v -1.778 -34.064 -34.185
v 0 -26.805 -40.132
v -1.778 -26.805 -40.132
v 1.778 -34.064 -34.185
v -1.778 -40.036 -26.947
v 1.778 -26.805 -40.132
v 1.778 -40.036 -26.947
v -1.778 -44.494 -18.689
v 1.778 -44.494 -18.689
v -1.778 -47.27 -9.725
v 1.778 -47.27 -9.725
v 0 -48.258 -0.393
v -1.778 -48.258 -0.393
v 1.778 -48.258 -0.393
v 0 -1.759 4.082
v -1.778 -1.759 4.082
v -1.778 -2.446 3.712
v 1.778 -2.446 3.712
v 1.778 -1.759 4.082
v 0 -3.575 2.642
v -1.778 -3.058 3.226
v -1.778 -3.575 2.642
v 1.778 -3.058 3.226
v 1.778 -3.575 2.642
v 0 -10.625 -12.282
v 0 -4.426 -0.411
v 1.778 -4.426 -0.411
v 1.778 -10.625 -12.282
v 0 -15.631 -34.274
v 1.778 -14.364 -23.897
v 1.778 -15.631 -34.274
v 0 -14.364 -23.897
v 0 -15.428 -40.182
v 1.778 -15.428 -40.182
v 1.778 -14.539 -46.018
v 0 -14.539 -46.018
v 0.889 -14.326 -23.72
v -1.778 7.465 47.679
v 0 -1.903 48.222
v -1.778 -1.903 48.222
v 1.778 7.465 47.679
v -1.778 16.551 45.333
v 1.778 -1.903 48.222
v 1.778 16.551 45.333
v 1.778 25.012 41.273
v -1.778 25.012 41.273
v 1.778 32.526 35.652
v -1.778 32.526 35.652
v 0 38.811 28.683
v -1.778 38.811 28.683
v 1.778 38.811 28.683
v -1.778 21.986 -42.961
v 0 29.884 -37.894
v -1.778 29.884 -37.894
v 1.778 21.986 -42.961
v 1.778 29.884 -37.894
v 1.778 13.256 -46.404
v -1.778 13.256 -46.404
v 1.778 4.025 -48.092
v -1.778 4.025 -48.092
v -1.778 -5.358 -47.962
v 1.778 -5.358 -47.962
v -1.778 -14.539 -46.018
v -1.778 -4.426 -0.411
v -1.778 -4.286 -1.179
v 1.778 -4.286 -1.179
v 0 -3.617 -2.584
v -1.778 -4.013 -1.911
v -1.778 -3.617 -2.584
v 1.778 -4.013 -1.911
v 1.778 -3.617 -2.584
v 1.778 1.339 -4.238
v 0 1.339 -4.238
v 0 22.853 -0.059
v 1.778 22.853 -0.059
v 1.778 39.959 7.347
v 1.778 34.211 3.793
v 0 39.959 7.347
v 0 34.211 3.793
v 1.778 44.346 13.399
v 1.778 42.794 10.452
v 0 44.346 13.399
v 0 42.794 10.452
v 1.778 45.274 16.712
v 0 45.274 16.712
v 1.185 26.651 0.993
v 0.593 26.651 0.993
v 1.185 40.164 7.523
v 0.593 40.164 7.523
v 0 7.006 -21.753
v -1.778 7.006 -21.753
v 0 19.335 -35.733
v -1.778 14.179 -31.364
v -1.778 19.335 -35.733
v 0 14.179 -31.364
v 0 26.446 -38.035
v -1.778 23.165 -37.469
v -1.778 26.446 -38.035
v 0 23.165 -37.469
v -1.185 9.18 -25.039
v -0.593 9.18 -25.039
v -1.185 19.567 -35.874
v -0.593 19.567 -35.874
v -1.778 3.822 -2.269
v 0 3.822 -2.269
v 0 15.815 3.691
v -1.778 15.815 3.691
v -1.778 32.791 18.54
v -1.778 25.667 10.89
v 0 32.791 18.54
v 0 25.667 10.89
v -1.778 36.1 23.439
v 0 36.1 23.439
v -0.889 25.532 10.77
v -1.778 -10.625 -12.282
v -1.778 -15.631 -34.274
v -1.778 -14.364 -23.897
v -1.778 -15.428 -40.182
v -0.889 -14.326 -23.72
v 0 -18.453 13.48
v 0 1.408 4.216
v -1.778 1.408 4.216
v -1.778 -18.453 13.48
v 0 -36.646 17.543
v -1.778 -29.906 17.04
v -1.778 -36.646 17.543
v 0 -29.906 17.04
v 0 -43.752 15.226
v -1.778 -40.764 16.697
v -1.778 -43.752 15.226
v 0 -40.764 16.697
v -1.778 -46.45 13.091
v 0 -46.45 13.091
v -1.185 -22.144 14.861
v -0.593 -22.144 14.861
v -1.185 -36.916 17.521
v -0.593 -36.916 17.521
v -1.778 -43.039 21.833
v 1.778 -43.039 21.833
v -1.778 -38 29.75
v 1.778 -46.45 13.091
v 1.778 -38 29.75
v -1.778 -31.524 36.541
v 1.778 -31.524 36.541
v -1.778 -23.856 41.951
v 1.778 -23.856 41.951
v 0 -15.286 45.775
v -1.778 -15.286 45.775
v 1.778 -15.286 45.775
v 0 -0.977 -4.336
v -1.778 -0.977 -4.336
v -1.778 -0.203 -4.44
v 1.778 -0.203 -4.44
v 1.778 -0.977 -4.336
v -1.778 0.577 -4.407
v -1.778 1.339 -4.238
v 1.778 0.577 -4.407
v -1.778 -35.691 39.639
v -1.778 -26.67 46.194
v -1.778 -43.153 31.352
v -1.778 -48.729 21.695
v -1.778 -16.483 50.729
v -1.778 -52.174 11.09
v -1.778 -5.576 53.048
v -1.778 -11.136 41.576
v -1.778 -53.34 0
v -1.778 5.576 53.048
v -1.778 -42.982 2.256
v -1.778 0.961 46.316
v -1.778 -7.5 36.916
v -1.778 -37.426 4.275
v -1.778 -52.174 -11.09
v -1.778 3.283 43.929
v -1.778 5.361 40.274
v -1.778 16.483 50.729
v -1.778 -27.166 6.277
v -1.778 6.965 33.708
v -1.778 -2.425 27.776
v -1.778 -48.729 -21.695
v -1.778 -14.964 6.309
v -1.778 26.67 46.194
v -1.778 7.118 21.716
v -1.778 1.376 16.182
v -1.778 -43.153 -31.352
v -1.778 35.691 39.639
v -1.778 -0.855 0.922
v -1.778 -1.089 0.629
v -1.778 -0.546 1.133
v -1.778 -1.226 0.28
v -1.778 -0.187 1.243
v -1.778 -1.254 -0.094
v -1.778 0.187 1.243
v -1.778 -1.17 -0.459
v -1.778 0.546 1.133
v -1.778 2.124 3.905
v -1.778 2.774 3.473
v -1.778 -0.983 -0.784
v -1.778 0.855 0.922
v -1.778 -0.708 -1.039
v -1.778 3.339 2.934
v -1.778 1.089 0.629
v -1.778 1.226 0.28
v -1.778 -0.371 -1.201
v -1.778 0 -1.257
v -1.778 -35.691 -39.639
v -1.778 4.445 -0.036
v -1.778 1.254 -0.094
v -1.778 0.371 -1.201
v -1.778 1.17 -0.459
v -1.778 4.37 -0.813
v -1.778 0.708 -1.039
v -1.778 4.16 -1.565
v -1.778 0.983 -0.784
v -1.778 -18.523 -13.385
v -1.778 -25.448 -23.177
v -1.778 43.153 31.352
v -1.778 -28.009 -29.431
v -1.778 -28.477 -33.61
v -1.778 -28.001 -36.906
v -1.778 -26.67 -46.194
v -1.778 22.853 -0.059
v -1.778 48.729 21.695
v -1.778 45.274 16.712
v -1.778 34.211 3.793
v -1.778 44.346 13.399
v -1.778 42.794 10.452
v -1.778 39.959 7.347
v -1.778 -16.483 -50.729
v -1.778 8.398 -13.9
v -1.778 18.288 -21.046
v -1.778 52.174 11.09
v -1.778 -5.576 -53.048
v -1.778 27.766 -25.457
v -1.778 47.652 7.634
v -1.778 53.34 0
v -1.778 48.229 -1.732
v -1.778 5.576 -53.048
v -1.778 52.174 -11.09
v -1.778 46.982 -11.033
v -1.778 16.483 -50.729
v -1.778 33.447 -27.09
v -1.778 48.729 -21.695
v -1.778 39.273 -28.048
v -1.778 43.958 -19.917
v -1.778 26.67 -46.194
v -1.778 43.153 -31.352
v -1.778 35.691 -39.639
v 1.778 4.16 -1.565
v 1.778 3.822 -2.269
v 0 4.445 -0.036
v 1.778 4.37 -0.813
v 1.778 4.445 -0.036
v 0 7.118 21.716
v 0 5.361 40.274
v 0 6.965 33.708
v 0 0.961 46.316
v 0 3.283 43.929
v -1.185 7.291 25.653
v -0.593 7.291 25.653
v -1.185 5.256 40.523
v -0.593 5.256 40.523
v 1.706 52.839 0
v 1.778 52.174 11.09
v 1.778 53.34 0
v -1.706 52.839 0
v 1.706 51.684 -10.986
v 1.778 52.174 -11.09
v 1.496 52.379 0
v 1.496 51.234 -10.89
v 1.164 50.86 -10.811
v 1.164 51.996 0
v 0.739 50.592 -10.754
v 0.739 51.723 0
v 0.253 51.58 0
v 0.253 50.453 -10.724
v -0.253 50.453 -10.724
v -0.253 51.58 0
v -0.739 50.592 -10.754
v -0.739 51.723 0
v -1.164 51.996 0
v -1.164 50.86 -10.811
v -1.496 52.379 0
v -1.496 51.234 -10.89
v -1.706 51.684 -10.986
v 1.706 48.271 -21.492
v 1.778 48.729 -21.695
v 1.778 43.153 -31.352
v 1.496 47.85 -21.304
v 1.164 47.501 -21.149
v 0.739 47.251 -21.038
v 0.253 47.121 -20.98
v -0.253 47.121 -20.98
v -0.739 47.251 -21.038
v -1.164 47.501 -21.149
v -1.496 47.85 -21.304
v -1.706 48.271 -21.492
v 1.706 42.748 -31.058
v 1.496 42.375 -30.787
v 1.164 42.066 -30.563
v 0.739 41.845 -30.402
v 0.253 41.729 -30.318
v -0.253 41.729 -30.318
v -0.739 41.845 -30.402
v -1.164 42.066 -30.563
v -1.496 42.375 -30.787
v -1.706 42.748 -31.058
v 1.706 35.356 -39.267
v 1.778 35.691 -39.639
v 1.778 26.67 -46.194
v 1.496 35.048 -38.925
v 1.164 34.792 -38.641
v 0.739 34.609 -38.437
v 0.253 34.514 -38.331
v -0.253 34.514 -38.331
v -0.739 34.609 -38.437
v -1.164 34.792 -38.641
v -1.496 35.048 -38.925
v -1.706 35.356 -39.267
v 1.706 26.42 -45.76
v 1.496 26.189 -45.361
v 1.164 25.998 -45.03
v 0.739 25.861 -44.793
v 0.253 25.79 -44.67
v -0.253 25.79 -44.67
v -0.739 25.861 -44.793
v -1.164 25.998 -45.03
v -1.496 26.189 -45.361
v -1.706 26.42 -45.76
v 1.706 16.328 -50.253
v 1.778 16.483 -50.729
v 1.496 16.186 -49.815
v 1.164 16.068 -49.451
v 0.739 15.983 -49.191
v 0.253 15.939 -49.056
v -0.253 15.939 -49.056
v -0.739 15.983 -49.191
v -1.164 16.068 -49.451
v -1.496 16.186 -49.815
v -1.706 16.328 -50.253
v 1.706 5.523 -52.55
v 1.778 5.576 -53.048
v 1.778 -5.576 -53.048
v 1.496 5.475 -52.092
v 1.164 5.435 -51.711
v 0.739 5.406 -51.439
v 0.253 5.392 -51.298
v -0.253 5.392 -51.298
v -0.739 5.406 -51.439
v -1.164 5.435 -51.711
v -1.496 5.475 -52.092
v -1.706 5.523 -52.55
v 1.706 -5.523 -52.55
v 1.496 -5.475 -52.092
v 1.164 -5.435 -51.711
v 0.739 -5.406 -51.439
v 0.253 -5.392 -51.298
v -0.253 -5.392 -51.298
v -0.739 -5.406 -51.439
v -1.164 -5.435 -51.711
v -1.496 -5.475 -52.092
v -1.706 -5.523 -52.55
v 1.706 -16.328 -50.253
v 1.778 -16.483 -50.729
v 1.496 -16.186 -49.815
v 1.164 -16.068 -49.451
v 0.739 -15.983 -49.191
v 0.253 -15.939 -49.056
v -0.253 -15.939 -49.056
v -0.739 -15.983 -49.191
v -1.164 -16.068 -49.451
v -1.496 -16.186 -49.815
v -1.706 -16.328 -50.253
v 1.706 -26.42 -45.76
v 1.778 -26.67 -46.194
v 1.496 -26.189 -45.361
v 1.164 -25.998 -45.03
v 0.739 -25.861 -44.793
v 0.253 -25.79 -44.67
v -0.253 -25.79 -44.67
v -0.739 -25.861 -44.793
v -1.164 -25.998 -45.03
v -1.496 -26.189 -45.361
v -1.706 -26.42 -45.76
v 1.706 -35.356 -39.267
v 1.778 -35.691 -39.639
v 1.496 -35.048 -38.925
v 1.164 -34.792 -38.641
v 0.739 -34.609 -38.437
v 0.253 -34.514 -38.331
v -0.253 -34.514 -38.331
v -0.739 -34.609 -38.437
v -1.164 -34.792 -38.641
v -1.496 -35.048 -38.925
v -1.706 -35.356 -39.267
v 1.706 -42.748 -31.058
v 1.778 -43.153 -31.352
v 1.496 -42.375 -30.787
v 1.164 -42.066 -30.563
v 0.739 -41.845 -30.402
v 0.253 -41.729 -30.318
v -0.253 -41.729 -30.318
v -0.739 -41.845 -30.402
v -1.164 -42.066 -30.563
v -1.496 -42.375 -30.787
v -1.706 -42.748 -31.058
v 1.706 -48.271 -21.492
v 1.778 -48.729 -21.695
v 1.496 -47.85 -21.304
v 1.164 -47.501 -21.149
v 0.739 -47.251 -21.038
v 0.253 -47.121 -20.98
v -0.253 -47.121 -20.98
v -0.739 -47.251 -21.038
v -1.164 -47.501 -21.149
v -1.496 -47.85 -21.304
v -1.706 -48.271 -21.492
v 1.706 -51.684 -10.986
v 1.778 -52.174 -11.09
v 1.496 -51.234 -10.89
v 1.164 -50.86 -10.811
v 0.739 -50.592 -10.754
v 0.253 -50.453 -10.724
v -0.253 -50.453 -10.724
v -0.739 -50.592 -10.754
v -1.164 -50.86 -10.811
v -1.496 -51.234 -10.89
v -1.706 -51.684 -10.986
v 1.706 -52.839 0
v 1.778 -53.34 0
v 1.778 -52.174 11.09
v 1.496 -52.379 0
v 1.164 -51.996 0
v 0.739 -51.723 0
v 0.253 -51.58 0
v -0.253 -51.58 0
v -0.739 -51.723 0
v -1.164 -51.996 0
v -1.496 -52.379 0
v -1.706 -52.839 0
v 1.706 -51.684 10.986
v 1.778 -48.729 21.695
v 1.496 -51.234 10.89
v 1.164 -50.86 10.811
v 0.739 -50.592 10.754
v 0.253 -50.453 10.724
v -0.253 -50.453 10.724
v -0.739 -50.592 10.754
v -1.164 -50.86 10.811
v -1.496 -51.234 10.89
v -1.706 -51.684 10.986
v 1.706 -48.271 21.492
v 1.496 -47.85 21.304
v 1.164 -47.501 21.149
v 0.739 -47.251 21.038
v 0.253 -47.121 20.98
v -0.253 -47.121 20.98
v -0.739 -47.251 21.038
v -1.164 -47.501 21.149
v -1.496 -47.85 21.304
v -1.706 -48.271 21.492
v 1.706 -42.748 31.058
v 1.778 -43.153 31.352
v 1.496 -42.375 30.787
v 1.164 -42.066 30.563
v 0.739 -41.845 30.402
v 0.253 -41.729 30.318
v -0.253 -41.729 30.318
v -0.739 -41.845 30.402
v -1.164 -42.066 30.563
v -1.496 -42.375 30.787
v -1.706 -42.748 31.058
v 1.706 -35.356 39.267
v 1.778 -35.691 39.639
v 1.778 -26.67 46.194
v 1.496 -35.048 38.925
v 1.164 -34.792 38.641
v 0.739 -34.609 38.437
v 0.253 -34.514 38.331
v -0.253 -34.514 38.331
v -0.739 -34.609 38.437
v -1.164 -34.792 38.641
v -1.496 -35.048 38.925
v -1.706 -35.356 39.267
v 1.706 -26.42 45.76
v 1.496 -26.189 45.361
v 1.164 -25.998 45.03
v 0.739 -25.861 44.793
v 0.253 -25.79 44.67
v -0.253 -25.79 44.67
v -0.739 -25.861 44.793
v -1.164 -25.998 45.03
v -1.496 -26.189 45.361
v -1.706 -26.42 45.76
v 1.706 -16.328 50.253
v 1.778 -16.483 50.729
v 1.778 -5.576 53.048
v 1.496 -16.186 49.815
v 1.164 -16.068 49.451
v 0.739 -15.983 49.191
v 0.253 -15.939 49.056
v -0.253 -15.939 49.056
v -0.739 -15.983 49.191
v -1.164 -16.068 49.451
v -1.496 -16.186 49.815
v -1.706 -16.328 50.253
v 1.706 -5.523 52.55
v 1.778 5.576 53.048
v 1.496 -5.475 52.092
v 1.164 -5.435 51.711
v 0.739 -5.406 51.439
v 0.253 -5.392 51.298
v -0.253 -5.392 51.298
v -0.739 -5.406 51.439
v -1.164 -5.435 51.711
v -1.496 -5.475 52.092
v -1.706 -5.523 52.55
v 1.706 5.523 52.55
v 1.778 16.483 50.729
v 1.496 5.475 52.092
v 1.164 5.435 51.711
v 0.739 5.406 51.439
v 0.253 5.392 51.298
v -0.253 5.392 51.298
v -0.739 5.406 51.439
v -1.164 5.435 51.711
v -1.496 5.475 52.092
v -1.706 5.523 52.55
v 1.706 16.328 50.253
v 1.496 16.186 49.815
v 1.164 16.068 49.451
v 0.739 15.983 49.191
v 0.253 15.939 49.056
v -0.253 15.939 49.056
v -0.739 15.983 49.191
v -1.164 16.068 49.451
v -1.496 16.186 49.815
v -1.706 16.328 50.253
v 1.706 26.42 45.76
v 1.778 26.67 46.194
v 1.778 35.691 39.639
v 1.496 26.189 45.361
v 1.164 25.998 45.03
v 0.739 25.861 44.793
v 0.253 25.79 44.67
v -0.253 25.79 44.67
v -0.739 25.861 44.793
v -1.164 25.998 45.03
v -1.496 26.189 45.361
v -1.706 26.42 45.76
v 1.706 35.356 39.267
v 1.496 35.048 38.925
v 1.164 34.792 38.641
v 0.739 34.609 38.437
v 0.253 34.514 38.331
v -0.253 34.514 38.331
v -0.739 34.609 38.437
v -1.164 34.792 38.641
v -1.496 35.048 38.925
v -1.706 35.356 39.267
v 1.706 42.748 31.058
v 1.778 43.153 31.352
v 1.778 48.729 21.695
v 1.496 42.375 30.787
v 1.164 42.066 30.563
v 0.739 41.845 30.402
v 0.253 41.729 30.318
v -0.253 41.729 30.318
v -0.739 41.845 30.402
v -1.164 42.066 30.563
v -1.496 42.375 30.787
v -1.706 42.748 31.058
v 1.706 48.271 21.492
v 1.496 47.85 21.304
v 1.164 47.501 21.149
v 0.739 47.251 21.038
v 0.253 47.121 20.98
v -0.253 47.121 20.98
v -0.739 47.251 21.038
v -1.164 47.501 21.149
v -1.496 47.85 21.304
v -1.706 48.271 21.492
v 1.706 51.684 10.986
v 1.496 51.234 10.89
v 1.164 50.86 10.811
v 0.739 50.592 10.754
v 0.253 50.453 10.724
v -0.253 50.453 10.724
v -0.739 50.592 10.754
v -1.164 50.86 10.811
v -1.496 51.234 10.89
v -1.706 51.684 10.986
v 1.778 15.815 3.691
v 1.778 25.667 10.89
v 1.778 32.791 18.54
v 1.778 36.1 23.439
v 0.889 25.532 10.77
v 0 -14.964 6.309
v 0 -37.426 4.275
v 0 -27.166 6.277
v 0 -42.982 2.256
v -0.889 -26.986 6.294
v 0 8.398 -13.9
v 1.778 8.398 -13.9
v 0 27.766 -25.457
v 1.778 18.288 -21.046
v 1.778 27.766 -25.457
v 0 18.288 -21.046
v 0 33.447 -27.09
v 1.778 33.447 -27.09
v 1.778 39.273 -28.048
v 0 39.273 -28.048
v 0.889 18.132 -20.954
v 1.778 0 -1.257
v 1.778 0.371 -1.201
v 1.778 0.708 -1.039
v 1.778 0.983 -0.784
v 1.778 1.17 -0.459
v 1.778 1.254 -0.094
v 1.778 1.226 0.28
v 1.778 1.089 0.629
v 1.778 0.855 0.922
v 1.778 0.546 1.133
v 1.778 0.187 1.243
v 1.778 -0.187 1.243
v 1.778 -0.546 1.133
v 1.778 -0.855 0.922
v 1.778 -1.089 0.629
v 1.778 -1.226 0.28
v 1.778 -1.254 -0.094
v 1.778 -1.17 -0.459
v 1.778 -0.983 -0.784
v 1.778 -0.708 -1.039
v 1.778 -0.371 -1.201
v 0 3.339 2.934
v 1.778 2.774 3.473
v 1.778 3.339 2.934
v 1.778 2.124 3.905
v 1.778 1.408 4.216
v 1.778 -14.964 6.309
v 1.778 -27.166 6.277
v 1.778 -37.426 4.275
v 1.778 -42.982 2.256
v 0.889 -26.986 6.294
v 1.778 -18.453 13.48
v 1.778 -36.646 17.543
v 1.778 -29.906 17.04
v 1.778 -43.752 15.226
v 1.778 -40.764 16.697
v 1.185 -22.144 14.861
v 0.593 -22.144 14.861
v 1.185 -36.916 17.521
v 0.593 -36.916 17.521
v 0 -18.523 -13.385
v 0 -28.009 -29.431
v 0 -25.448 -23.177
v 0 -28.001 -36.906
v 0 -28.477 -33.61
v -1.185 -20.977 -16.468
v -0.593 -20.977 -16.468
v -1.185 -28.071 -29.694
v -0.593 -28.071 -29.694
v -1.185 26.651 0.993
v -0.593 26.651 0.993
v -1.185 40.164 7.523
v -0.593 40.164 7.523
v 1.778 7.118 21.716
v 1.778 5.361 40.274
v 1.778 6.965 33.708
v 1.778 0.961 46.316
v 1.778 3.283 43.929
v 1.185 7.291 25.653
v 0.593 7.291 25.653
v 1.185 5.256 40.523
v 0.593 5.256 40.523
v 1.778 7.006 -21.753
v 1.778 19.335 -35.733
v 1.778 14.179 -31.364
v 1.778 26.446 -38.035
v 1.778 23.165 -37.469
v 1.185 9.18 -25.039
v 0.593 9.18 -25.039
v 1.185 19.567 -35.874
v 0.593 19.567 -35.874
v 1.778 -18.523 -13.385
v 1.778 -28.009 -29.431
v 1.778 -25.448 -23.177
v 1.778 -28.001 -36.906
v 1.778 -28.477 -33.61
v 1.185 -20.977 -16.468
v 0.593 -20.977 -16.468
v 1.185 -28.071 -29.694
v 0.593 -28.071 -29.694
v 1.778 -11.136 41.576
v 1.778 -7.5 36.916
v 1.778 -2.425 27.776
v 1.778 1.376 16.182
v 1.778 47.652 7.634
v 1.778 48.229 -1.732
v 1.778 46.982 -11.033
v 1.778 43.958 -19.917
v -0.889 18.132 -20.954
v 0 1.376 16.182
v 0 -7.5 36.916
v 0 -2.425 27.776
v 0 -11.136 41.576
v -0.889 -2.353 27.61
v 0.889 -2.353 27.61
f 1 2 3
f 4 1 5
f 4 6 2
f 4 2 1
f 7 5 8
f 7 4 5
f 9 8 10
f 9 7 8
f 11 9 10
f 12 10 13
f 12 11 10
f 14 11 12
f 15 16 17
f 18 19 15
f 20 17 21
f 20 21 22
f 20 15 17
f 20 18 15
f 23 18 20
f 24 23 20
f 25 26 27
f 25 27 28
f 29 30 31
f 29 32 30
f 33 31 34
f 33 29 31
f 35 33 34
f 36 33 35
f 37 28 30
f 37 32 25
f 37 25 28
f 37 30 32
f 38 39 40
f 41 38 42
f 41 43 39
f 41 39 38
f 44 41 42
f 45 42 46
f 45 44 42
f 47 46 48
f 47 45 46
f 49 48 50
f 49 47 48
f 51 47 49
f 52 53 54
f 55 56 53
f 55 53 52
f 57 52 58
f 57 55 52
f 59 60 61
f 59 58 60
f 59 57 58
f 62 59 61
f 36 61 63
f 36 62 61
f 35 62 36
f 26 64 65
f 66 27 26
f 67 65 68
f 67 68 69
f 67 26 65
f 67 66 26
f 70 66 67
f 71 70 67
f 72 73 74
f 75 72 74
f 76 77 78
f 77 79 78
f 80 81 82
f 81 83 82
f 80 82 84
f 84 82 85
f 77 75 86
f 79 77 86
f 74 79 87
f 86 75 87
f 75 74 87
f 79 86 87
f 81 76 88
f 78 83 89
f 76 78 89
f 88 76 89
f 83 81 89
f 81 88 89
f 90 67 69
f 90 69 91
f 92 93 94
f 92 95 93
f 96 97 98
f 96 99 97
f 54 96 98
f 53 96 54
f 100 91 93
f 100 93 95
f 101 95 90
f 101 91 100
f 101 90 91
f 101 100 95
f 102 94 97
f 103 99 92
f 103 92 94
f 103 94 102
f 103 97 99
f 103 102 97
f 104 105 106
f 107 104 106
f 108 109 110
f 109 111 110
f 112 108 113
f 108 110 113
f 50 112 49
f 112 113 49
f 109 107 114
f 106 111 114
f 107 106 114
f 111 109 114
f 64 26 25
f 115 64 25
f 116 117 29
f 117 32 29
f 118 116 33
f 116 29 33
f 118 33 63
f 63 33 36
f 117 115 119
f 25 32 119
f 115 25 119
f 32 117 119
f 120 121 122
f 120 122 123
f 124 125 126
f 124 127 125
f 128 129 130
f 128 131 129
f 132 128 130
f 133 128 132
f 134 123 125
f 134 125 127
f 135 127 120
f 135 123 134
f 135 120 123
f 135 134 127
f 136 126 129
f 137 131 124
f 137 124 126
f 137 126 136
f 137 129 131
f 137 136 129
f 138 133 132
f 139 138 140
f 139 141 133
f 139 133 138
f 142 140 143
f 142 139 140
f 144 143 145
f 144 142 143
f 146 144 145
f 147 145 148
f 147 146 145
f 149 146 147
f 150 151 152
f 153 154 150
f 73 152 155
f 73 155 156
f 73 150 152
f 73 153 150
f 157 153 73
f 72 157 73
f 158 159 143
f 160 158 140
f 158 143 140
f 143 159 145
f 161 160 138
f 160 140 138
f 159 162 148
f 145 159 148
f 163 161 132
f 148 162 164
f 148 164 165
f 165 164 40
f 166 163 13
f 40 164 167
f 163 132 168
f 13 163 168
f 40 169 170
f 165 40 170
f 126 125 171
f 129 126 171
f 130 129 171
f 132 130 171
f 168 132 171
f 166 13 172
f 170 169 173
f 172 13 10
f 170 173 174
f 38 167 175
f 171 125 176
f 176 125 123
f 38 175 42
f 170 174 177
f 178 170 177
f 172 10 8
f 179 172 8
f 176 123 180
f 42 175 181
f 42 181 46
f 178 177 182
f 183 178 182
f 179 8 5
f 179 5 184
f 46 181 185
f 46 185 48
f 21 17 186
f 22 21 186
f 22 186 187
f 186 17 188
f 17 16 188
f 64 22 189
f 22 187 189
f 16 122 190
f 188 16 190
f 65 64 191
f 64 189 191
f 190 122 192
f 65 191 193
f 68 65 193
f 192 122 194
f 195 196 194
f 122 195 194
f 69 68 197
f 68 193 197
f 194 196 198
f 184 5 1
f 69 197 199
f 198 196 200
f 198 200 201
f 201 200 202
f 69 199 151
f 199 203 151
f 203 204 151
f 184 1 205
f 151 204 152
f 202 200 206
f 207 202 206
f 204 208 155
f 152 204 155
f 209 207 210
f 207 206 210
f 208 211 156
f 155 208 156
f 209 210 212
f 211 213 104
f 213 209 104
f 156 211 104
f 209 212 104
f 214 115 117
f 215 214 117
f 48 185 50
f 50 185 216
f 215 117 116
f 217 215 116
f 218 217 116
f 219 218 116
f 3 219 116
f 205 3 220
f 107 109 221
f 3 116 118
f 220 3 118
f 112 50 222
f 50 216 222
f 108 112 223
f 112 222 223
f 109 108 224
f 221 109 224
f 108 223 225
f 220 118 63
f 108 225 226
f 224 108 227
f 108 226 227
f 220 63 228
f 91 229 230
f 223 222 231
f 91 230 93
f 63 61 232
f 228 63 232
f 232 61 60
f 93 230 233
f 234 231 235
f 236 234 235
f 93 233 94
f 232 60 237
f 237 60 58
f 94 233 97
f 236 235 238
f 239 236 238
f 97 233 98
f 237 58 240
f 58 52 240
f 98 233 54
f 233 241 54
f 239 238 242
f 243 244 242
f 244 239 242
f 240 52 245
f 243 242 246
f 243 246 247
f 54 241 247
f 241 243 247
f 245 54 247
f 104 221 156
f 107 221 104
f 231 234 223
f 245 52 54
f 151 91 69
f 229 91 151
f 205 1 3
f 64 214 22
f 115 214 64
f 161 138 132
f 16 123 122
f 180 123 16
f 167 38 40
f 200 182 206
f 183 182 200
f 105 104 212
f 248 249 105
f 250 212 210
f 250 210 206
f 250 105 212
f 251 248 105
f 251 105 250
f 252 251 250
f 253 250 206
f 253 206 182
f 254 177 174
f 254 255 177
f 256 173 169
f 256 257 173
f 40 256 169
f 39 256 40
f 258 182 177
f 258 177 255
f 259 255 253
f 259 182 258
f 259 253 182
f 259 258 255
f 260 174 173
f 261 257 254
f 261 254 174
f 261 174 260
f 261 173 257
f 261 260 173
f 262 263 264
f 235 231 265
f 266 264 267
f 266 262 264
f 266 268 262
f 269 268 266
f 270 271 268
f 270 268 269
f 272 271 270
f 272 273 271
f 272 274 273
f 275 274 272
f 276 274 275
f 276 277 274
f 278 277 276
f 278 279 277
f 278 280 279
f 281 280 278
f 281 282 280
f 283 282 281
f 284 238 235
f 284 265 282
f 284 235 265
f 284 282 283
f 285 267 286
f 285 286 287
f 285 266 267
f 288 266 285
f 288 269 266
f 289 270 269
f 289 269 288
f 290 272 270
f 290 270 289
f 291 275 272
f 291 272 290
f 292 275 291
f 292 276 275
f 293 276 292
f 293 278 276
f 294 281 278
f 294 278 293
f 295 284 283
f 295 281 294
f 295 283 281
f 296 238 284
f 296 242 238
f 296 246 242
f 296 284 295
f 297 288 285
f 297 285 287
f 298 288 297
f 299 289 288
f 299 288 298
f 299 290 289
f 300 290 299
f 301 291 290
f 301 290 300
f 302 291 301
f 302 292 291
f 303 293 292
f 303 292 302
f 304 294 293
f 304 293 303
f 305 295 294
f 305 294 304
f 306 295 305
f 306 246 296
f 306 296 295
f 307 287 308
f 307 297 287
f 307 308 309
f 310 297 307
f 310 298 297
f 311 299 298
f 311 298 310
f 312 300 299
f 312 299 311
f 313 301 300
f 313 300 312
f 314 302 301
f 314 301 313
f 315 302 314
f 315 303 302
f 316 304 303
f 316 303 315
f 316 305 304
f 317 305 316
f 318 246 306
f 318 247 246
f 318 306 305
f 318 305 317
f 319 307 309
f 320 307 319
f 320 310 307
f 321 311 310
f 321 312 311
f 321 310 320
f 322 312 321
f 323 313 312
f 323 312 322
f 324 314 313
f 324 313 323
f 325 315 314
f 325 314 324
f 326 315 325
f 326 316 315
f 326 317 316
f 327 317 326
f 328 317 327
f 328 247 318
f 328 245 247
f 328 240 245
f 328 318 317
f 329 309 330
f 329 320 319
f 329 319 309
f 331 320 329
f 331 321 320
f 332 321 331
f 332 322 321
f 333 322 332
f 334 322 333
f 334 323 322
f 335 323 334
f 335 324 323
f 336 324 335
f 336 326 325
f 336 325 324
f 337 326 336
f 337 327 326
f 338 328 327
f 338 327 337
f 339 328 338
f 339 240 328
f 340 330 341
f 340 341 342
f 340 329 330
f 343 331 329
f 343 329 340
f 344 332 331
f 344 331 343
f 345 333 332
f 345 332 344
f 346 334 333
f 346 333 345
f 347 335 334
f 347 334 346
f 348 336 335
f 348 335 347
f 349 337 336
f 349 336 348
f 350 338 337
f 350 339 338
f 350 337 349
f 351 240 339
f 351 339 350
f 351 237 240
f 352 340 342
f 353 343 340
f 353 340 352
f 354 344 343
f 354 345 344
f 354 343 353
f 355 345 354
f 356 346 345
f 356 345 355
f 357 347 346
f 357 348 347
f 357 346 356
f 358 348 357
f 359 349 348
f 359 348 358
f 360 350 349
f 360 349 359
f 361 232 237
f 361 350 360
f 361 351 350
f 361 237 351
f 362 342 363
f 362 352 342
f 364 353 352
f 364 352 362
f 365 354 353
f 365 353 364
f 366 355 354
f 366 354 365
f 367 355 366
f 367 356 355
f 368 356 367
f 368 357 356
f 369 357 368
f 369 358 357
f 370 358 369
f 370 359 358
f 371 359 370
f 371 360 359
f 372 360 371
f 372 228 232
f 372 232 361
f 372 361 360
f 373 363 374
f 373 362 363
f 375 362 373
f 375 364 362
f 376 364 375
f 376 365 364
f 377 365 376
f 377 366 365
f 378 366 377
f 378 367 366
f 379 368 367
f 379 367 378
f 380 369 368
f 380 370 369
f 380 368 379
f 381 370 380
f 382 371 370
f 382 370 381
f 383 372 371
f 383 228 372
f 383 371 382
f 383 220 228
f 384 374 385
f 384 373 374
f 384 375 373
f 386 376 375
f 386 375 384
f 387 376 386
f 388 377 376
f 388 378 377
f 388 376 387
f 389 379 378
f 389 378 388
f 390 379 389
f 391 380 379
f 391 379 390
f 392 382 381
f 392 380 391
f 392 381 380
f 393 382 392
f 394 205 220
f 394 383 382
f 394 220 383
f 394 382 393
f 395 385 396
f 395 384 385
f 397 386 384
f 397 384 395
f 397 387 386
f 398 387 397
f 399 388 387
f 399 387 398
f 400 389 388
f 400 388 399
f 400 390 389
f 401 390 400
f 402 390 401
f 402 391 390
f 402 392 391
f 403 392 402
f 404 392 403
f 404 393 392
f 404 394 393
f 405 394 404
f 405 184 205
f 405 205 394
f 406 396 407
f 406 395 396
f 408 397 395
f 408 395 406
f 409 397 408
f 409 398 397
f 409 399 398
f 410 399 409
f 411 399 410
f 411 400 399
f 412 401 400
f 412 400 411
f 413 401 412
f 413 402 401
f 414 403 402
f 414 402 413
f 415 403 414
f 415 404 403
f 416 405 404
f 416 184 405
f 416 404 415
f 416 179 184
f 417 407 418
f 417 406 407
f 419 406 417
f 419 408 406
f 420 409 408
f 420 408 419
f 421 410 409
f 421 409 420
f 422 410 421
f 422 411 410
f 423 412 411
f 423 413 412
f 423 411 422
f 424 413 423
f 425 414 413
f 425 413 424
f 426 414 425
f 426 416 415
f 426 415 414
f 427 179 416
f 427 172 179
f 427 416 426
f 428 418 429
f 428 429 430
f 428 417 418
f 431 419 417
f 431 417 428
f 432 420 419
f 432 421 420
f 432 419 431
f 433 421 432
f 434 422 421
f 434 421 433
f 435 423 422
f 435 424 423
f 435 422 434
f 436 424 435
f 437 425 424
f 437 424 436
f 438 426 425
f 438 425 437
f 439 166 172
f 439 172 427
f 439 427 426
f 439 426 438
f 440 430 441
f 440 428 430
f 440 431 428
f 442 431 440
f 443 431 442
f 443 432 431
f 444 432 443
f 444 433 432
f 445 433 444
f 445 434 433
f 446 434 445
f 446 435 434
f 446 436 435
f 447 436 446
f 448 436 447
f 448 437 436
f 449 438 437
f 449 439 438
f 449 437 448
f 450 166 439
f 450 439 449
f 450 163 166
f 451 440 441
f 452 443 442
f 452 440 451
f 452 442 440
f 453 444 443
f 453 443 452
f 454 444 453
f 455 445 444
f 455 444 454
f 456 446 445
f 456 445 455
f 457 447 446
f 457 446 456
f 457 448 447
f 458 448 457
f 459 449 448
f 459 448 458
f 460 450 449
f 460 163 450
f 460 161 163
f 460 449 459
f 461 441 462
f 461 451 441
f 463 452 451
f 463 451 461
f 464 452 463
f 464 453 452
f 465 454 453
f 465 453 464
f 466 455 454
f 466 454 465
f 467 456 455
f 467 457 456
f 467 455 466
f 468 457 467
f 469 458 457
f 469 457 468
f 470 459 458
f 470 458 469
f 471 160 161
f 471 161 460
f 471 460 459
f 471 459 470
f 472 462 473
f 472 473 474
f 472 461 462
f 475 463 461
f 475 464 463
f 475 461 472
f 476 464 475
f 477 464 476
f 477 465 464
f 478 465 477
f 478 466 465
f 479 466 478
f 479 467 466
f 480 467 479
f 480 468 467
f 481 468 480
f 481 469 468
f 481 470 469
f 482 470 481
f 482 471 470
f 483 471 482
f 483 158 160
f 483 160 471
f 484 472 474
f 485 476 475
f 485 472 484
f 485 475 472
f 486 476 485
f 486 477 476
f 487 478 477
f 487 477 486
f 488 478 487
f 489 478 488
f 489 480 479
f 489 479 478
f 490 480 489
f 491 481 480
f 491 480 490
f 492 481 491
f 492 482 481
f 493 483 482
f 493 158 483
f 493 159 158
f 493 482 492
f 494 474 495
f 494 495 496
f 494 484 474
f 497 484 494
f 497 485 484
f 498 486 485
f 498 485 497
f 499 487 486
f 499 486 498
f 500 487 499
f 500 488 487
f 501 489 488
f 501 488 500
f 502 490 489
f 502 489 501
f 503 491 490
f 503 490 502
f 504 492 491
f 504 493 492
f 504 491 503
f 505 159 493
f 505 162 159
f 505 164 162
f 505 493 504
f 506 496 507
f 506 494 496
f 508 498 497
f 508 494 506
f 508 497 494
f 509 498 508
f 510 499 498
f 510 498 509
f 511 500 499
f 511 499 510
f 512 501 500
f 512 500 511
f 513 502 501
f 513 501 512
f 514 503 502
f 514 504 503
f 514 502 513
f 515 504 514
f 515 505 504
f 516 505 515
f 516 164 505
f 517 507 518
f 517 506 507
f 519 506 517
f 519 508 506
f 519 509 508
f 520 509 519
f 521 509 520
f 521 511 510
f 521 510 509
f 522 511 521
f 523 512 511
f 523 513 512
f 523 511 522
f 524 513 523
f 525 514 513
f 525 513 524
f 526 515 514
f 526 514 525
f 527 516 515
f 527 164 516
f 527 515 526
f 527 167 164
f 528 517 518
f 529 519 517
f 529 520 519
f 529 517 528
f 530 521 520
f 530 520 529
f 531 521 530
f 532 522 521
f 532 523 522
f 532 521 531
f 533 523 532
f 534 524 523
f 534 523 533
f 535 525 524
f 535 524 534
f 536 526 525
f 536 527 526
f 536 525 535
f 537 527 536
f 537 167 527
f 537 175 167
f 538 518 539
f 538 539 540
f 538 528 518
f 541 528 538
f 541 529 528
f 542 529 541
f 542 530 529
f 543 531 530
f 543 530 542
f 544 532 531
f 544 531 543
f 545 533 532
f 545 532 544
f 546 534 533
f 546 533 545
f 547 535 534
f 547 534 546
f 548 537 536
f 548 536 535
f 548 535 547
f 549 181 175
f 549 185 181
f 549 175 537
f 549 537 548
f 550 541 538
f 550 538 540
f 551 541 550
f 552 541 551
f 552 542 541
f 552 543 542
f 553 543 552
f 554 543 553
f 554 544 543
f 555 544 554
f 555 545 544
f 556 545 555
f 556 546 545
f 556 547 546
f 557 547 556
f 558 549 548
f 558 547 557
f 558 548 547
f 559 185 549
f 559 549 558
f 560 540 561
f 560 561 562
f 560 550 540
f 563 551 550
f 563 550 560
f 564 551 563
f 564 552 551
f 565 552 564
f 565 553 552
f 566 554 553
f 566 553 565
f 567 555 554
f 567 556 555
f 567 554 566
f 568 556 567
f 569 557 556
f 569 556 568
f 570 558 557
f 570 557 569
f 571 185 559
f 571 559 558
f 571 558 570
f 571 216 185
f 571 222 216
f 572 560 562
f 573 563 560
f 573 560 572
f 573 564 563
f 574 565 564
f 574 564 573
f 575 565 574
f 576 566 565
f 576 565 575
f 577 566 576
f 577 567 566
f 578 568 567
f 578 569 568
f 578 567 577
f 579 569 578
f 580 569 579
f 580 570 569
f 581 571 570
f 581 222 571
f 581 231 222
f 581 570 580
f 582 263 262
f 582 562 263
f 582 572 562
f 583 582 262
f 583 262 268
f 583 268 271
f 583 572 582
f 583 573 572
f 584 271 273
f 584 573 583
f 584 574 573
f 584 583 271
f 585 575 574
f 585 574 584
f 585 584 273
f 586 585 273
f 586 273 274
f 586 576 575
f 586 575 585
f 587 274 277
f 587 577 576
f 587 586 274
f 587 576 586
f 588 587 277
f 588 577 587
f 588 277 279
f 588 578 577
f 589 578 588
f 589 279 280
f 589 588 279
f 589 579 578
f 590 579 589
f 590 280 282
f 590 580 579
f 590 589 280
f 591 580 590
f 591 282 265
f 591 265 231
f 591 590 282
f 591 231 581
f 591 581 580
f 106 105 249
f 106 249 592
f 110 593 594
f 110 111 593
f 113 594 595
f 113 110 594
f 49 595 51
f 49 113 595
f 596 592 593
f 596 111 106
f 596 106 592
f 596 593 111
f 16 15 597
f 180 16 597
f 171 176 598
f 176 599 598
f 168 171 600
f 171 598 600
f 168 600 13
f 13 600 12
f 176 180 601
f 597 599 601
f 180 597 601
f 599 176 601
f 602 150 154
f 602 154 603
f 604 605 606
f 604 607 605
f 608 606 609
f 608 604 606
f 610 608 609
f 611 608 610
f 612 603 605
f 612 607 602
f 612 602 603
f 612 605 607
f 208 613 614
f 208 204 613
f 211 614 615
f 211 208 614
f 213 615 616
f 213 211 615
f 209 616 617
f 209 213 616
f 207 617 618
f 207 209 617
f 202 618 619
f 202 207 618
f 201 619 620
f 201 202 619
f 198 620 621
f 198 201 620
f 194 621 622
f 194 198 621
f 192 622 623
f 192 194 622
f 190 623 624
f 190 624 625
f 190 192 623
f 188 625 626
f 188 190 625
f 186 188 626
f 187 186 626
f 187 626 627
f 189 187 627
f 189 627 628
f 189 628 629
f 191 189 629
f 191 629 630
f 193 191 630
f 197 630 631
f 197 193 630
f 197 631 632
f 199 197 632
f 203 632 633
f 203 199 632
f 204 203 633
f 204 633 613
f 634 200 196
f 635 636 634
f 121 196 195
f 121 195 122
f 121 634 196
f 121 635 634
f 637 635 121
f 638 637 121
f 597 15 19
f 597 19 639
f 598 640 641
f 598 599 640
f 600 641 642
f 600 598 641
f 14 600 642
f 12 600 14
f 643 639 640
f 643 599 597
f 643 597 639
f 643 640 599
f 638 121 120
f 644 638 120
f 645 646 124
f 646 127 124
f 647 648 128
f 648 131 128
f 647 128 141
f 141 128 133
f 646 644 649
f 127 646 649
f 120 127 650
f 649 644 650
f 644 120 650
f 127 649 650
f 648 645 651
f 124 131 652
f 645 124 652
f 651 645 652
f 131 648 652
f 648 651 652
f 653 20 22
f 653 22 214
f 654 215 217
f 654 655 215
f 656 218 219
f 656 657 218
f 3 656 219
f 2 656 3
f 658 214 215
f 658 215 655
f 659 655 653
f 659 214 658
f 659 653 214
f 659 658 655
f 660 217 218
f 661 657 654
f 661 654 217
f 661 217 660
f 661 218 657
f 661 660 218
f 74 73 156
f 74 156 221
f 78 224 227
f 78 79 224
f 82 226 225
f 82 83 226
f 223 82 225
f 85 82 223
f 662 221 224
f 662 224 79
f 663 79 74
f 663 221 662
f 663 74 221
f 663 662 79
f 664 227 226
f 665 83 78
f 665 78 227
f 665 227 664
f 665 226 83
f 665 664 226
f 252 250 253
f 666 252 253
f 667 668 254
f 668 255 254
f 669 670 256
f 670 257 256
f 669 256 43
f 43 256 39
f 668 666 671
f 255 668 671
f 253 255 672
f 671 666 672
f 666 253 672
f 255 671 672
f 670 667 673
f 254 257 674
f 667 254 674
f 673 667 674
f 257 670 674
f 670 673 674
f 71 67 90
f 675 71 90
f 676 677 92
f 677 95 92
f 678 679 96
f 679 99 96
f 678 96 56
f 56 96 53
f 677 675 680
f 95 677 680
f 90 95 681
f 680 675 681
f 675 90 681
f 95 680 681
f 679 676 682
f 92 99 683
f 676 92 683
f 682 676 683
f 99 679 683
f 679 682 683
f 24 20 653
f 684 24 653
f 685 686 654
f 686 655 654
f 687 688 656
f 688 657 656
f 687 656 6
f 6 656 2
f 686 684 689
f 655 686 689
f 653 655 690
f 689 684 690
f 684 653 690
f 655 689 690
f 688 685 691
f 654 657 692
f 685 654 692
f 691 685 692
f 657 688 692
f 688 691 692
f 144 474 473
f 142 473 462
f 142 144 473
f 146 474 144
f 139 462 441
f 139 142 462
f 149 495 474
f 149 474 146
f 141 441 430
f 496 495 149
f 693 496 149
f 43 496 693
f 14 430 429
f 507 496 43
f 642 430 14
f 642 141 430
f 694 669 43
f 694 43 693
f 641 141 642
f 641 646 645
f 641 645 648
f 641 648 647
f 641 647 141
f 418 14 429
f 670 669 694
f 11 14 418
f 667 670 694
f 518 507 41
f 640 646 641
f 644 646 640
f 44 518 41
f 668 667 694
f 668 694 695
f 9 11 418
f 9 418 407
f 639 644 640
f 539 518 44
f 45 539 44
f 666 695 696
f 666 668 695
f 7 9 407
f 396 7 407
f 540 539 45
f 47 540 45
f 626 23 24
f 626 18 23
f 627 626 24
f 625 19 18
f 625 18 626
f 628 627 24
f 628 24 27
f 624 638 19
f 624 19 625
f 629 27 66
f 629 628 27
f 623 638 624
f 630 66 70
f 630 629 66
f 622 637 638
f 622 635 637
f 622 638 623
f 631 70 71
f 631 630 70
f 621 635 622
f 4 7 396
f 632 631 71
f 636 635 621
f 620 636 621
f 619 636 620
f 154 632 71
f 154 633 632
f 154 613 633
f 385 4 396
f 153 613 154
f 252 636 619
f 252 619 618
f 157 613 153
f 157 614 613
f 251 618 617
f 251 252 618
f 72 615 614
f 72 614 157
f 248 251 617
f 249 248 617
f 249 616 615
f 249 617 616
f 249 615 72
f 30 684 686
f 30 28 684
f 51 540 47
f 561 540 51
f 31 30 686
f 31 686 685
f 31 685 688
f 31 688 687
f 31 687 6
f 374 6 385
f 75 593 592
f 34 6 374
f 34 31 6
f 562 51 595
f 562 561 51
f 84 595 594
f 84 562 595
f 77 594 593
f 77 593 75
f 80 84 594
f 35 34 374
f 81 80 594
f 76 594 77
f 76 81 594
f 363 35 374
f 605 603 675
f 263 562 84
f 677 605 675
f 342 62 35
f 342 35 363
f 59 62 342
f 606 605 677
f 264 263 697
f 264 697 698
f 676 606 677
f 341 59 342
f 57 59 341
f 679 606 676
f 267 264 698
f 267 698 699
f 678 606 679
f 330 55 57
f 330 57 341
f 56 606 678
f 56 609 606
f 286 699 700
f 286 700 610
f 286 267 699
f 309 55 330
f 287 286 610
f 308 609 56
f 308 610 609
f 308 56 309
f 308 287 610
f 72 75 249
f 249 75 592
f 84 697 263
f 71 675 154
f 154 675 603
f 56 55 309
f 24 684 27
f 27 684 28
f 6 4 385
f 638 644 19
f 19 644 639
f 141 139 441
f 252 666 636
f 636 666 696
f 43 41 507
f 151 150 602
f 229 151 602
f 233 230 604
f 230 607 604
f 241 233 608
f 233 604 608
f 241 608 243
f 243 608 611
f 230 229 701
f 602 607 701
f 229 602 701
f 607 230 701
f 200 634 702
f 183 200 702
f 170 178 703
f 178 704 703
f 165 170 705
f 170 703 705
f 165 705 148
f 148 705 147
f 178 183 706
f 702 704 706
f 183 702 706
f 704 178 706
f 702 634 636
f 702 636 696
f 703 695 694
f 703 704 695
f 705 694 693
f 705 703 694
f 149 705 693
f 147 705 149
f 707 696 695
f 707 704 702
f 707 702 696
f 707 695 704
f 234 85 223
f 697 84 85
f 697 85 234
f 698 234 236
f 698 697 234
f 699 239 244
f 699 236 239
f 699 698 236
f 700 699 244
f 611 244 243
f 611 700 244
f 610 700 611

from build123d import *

# Parameters (mm, degrees)
SKETCH3_R           = 4.445
SKETCH3_R_2         = 1.2573
BOSS_EXTRUDE1_DEPTH = 1.778
BOSS_EXTRUDE2_DEPTH = 1.778
CIRPATTERN1_COUNT   = 5


with BuildPart() as part:
    # Sketch1 → Revolve1 (revolve)
    with BuildSketch(Plane.XY):
        with BuildLine():
            Line((-1.778, 48.26), (1.778, 48.26))
            Line((1.778, 48.26), (1.778, 53.34))
            ThreePointArc((1.778, 53.34), (0, 51.562), (-1.778, 53.34))
            Line((-1.778, 53.34), (-1.778, 48.26))
        make_face()
    revolve(axis=Axis((0, 0, 0), (-1, 0, 0)))



with BuildPart() as body_2:
    # Sketch3 → Boss-Extrude1 (new body, symmetric)
    with BuildSketch(Plane(origin=(0, 0, 0), x_dir=(0, 0, -1), z_dir=(1, 0, 0))):
        Circle(SKETCH3_R)
        Circle(SKETCH3_R_2, mode=Mode.SUBTRACT)
    extrude(amount=BOSS_EXTRUDE1_DEPTH, both=True)


with BuildPart() as part_1:
    add(part.part)

    add(body_2.part)  # Boss-Extrude2 merges body 2
    # Sketch4 → Boss-Extrude2 (add, symmetric)
    with BuildSketch(Plane(origin=(0, 0, 0), x_dir=(0, 0, -1), z_dir=(1, 0, 0))):
        with BuildLine():
            add(Edge.make_bspline(
                [(4.238371501, 1.339489461), (-0.797084769, 33.68038201), (-5.741030131, 43.234836537), (-16.711740024, 45.274113413)],
                knots=[0.007862153, 0.007862153, 0.007862153, 0.007862153, 0.582841342, 0.582841342, 0.582841342, 0.582841342], degree=3))
            ThreePointArc((-16.711740024, 45.274113413), (-22.926461421, 42.466515829), (-28.683393703, 38.810958835))
            add(Edge.make_bspline(
                [(2.269041799, 3.822234204), (-8.332097903, 29.7473311), (-28.683393703, 38.810958835)],
                knots=[0, 0, 0, 0.658247548, 0.658247548, 0.658247548], degree=2))
            ThreePointArc((2.269041799, 3.822234204), (3.482472158, 2.76232016), (4.238371501, 1.339489461))
        make_face()
    boss_extrude2 = extrude(amount=BOSS_EXTRUDE2_DEPTH, both=True)

    # CirPattern1: Boss-Extrude2 ×5 about axis
    cirpattern1_axis = Axis((0, 0, 0), (1, 0, 0))
    for i in range(1, CIRPATTERN1_COUNT):
        add(boss_extrude2.rotate(cirpattern1_axis, i * 360 / CIRPATTERN1_COUNT))


solid = part_1.part
